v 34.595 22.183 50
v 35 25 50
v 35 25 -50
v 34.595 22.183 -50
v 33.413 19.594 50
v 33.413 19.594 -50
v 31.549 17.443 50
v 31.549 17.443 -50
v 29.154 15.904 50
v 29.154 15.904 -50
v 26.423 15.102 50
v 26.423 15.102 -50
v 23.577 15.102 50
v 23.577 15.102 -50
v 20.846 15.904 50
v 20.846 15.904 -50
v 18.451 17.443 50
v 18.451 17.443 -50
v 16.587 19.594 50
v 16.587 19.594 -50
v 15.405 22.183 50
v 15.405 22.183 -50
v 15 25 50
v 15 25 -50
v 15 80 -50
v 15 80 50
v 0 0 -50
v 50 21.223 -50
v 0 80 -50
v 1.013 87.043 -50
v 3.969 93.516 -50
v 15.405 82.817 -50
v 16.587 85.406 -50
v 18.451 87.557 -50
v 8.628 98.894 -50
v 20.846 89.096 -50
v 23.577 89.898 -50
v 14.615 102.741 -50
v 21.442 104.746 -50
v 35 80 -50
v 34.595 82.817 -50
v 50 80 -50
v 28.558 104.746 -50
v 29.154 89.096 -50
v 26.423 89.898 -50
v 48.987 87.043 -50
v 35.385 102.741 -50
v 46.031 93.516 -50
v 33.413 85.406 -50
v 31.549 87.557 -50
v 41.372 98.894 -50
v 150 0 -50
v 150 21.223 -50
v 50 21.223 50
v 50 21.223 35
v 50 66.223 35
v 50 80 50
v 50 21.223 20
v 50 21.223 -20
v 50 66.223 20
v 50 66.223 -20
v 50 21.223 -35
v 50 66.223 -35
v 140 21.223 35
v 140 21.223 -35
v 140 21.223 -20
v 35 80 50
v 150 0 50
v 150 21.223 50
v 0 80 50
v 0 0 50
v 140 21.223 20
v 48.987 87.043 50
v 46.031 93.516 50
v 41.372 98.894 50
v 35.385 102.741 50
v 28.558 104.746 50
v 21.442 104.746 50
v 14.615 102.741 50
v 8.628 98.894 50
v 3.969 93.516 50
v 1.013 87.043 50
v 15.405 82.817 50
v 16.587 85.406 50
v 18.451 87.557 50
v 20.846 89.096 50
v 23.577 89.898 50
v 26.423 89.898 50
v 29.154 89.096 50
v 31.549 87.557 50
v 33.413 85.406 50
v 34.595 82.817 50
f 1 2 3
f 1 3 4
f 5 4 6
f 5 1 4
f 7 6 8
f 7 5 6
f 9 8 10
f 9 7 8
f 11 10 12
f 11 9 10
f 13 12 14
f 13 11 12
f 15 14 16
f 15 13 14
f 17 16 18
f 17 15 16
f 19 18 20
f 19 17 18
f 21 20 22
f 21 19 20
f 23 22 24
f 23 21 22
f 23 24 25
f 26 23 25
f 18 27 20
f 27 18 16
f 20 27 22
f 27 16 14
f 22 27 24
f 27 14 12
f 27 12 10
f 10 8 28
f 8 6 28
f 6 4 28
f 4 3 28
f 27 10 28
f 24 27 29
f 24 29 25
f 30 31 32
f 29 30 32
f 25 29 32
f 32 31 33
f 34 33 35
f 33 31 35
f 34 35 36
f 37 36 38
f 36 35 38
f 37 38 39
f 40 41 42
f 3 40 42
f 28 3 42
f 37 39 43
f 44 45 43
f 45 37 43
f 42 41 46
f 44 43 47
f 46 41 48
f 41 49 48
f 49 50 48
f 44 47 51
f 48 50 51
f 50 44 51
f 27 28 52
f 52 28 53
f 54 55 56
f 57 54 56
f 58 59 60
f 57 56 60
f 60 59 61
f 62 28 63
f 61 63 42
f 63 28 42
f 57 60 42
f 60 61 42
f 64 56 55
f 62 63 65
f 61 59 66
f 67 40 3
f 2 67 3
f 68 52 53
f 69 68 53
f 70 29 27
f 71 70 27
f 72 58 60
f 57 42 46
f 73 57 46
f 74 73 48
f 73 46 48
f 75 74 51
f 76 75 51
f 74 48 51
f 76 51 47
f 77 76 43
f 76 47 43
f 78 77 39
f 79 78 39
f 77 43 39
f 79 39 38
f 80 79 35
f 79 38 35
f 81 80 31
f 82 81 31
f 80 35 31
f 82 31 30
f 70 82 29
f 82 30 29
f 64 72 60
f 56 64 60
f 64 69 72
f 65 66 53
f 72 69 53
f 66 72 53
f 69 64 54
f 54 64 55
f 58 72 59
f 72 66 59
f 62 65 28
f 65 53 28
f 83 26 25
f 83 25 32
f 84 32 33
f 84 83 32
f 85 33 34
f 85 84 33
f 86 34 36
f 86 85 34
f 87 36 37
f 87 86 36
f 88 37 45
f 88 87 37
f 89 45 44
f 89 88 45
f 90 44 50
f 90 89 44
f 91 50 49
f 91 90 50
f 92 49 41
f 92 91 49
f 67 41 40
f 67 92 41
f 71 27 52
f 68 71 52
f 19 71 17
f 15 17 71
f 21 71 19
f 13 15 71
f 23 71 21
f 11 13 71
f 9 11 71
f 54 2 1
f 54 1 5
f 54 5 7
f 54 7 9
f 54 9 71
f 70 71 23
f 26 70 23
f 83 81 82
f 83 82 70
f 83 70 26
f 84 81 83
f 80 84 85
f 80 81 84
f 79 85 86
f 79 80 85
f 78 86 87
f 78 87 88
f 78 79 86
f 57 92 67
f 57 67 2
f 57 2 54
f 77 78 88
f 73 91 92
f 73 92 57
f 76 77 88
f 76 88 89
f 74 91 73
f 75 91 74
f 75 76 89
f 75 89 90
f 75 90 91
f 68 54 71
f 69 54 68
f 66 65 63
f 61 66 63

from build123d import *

# Parameters (mm, degrees)
BOSS_EXTRUDE2_DEPTH      = 50
BOSS_EXTRUDE2_DEPTH_BACK = 50
CUT_EXTRUDE2_DEPTH       = 209.62646045
BOSS_EXTRUDE3_DEPTH      = 35
BOSS_EXTRUDE3_DEPTH_BACK = 35
SKETCH10_W               = 99.044902454
SKETCH10_H               = 40
CUT_EXTRUDE3_DEPTH       = 179.937459443


with BuildPart() as part:
    # Sketch1 → Boss-Extrude2 (new, two sides: drawn at the far end of the back side and taken through both)
    with BuildSketch(Plane.XY.offset(-BOSS_EXTRUDE2_DEPTH_BACK)):
        with BuildLine():
            Line((0, 0), (150, 0))
            Line((150, 0), (150, 21.222828934))
            Line((150, 21.222828934), (50, 21.222828934))
            Line((50, 21.222828934), (50, 80))
            ThreePointArc((50, 80), (25, 105), (0, 80))
            Line((0, 80), (0, 0))
        make_face()
    extrude(amount=BOSS_EXTRUDE2_DEPTH + BOSS_EXTRUDE2_DEPTH_BACK)

    # Sketch7 → Cut-Extrude2 (cut, through all)
    with BuildSketch(Plane.XY.offset(50)):
        with BuildLine():
            Line((35, 80), (35, 25))
            ThreePointArc((35, 25), (25, 15), (15, 25))
            Line((15, 25), (15, 80))
            ThreePointArc((15, 80), (25, 90), (35, 80))
        make_face()
    extrude(amount=-CUT_EXTRUDE2_DEPTH, mode=Mode.SUBTRACT)

    # Sketch9 → Boss-Extrude3 (add, two sides: drawn at the far end of the back side and taken through both)
    with BuildSketch(Plane.XY.offset(-BOSS_EXTRUDE3_DEPTH_BACK)):
        Polygon((50, 66.222828934), (50, 21.222828934), (140, 21.222828934), align=None)
    extrude(amount=BOSS_EXTRUDE3_DEPTH + BOSS_EXTRUDE3_DEPTH_BACK)

    # Sketch10 → Cut-Extrude3 (cut, through all)
    with BuildSketch(Plane(origin=(0, 21.222828934, 0), x_dir=(1, 0, 0), z_dir=(0, 1, 0))):
        with Locations((99.522451227, 0)):
            Rectangle(SKETCH10_W, SKETCH10_H)
    extrude(amount=CUT_EXTRUDE3_DEPTH, mode=Mode.SUBTRACT)


solid = part.part
